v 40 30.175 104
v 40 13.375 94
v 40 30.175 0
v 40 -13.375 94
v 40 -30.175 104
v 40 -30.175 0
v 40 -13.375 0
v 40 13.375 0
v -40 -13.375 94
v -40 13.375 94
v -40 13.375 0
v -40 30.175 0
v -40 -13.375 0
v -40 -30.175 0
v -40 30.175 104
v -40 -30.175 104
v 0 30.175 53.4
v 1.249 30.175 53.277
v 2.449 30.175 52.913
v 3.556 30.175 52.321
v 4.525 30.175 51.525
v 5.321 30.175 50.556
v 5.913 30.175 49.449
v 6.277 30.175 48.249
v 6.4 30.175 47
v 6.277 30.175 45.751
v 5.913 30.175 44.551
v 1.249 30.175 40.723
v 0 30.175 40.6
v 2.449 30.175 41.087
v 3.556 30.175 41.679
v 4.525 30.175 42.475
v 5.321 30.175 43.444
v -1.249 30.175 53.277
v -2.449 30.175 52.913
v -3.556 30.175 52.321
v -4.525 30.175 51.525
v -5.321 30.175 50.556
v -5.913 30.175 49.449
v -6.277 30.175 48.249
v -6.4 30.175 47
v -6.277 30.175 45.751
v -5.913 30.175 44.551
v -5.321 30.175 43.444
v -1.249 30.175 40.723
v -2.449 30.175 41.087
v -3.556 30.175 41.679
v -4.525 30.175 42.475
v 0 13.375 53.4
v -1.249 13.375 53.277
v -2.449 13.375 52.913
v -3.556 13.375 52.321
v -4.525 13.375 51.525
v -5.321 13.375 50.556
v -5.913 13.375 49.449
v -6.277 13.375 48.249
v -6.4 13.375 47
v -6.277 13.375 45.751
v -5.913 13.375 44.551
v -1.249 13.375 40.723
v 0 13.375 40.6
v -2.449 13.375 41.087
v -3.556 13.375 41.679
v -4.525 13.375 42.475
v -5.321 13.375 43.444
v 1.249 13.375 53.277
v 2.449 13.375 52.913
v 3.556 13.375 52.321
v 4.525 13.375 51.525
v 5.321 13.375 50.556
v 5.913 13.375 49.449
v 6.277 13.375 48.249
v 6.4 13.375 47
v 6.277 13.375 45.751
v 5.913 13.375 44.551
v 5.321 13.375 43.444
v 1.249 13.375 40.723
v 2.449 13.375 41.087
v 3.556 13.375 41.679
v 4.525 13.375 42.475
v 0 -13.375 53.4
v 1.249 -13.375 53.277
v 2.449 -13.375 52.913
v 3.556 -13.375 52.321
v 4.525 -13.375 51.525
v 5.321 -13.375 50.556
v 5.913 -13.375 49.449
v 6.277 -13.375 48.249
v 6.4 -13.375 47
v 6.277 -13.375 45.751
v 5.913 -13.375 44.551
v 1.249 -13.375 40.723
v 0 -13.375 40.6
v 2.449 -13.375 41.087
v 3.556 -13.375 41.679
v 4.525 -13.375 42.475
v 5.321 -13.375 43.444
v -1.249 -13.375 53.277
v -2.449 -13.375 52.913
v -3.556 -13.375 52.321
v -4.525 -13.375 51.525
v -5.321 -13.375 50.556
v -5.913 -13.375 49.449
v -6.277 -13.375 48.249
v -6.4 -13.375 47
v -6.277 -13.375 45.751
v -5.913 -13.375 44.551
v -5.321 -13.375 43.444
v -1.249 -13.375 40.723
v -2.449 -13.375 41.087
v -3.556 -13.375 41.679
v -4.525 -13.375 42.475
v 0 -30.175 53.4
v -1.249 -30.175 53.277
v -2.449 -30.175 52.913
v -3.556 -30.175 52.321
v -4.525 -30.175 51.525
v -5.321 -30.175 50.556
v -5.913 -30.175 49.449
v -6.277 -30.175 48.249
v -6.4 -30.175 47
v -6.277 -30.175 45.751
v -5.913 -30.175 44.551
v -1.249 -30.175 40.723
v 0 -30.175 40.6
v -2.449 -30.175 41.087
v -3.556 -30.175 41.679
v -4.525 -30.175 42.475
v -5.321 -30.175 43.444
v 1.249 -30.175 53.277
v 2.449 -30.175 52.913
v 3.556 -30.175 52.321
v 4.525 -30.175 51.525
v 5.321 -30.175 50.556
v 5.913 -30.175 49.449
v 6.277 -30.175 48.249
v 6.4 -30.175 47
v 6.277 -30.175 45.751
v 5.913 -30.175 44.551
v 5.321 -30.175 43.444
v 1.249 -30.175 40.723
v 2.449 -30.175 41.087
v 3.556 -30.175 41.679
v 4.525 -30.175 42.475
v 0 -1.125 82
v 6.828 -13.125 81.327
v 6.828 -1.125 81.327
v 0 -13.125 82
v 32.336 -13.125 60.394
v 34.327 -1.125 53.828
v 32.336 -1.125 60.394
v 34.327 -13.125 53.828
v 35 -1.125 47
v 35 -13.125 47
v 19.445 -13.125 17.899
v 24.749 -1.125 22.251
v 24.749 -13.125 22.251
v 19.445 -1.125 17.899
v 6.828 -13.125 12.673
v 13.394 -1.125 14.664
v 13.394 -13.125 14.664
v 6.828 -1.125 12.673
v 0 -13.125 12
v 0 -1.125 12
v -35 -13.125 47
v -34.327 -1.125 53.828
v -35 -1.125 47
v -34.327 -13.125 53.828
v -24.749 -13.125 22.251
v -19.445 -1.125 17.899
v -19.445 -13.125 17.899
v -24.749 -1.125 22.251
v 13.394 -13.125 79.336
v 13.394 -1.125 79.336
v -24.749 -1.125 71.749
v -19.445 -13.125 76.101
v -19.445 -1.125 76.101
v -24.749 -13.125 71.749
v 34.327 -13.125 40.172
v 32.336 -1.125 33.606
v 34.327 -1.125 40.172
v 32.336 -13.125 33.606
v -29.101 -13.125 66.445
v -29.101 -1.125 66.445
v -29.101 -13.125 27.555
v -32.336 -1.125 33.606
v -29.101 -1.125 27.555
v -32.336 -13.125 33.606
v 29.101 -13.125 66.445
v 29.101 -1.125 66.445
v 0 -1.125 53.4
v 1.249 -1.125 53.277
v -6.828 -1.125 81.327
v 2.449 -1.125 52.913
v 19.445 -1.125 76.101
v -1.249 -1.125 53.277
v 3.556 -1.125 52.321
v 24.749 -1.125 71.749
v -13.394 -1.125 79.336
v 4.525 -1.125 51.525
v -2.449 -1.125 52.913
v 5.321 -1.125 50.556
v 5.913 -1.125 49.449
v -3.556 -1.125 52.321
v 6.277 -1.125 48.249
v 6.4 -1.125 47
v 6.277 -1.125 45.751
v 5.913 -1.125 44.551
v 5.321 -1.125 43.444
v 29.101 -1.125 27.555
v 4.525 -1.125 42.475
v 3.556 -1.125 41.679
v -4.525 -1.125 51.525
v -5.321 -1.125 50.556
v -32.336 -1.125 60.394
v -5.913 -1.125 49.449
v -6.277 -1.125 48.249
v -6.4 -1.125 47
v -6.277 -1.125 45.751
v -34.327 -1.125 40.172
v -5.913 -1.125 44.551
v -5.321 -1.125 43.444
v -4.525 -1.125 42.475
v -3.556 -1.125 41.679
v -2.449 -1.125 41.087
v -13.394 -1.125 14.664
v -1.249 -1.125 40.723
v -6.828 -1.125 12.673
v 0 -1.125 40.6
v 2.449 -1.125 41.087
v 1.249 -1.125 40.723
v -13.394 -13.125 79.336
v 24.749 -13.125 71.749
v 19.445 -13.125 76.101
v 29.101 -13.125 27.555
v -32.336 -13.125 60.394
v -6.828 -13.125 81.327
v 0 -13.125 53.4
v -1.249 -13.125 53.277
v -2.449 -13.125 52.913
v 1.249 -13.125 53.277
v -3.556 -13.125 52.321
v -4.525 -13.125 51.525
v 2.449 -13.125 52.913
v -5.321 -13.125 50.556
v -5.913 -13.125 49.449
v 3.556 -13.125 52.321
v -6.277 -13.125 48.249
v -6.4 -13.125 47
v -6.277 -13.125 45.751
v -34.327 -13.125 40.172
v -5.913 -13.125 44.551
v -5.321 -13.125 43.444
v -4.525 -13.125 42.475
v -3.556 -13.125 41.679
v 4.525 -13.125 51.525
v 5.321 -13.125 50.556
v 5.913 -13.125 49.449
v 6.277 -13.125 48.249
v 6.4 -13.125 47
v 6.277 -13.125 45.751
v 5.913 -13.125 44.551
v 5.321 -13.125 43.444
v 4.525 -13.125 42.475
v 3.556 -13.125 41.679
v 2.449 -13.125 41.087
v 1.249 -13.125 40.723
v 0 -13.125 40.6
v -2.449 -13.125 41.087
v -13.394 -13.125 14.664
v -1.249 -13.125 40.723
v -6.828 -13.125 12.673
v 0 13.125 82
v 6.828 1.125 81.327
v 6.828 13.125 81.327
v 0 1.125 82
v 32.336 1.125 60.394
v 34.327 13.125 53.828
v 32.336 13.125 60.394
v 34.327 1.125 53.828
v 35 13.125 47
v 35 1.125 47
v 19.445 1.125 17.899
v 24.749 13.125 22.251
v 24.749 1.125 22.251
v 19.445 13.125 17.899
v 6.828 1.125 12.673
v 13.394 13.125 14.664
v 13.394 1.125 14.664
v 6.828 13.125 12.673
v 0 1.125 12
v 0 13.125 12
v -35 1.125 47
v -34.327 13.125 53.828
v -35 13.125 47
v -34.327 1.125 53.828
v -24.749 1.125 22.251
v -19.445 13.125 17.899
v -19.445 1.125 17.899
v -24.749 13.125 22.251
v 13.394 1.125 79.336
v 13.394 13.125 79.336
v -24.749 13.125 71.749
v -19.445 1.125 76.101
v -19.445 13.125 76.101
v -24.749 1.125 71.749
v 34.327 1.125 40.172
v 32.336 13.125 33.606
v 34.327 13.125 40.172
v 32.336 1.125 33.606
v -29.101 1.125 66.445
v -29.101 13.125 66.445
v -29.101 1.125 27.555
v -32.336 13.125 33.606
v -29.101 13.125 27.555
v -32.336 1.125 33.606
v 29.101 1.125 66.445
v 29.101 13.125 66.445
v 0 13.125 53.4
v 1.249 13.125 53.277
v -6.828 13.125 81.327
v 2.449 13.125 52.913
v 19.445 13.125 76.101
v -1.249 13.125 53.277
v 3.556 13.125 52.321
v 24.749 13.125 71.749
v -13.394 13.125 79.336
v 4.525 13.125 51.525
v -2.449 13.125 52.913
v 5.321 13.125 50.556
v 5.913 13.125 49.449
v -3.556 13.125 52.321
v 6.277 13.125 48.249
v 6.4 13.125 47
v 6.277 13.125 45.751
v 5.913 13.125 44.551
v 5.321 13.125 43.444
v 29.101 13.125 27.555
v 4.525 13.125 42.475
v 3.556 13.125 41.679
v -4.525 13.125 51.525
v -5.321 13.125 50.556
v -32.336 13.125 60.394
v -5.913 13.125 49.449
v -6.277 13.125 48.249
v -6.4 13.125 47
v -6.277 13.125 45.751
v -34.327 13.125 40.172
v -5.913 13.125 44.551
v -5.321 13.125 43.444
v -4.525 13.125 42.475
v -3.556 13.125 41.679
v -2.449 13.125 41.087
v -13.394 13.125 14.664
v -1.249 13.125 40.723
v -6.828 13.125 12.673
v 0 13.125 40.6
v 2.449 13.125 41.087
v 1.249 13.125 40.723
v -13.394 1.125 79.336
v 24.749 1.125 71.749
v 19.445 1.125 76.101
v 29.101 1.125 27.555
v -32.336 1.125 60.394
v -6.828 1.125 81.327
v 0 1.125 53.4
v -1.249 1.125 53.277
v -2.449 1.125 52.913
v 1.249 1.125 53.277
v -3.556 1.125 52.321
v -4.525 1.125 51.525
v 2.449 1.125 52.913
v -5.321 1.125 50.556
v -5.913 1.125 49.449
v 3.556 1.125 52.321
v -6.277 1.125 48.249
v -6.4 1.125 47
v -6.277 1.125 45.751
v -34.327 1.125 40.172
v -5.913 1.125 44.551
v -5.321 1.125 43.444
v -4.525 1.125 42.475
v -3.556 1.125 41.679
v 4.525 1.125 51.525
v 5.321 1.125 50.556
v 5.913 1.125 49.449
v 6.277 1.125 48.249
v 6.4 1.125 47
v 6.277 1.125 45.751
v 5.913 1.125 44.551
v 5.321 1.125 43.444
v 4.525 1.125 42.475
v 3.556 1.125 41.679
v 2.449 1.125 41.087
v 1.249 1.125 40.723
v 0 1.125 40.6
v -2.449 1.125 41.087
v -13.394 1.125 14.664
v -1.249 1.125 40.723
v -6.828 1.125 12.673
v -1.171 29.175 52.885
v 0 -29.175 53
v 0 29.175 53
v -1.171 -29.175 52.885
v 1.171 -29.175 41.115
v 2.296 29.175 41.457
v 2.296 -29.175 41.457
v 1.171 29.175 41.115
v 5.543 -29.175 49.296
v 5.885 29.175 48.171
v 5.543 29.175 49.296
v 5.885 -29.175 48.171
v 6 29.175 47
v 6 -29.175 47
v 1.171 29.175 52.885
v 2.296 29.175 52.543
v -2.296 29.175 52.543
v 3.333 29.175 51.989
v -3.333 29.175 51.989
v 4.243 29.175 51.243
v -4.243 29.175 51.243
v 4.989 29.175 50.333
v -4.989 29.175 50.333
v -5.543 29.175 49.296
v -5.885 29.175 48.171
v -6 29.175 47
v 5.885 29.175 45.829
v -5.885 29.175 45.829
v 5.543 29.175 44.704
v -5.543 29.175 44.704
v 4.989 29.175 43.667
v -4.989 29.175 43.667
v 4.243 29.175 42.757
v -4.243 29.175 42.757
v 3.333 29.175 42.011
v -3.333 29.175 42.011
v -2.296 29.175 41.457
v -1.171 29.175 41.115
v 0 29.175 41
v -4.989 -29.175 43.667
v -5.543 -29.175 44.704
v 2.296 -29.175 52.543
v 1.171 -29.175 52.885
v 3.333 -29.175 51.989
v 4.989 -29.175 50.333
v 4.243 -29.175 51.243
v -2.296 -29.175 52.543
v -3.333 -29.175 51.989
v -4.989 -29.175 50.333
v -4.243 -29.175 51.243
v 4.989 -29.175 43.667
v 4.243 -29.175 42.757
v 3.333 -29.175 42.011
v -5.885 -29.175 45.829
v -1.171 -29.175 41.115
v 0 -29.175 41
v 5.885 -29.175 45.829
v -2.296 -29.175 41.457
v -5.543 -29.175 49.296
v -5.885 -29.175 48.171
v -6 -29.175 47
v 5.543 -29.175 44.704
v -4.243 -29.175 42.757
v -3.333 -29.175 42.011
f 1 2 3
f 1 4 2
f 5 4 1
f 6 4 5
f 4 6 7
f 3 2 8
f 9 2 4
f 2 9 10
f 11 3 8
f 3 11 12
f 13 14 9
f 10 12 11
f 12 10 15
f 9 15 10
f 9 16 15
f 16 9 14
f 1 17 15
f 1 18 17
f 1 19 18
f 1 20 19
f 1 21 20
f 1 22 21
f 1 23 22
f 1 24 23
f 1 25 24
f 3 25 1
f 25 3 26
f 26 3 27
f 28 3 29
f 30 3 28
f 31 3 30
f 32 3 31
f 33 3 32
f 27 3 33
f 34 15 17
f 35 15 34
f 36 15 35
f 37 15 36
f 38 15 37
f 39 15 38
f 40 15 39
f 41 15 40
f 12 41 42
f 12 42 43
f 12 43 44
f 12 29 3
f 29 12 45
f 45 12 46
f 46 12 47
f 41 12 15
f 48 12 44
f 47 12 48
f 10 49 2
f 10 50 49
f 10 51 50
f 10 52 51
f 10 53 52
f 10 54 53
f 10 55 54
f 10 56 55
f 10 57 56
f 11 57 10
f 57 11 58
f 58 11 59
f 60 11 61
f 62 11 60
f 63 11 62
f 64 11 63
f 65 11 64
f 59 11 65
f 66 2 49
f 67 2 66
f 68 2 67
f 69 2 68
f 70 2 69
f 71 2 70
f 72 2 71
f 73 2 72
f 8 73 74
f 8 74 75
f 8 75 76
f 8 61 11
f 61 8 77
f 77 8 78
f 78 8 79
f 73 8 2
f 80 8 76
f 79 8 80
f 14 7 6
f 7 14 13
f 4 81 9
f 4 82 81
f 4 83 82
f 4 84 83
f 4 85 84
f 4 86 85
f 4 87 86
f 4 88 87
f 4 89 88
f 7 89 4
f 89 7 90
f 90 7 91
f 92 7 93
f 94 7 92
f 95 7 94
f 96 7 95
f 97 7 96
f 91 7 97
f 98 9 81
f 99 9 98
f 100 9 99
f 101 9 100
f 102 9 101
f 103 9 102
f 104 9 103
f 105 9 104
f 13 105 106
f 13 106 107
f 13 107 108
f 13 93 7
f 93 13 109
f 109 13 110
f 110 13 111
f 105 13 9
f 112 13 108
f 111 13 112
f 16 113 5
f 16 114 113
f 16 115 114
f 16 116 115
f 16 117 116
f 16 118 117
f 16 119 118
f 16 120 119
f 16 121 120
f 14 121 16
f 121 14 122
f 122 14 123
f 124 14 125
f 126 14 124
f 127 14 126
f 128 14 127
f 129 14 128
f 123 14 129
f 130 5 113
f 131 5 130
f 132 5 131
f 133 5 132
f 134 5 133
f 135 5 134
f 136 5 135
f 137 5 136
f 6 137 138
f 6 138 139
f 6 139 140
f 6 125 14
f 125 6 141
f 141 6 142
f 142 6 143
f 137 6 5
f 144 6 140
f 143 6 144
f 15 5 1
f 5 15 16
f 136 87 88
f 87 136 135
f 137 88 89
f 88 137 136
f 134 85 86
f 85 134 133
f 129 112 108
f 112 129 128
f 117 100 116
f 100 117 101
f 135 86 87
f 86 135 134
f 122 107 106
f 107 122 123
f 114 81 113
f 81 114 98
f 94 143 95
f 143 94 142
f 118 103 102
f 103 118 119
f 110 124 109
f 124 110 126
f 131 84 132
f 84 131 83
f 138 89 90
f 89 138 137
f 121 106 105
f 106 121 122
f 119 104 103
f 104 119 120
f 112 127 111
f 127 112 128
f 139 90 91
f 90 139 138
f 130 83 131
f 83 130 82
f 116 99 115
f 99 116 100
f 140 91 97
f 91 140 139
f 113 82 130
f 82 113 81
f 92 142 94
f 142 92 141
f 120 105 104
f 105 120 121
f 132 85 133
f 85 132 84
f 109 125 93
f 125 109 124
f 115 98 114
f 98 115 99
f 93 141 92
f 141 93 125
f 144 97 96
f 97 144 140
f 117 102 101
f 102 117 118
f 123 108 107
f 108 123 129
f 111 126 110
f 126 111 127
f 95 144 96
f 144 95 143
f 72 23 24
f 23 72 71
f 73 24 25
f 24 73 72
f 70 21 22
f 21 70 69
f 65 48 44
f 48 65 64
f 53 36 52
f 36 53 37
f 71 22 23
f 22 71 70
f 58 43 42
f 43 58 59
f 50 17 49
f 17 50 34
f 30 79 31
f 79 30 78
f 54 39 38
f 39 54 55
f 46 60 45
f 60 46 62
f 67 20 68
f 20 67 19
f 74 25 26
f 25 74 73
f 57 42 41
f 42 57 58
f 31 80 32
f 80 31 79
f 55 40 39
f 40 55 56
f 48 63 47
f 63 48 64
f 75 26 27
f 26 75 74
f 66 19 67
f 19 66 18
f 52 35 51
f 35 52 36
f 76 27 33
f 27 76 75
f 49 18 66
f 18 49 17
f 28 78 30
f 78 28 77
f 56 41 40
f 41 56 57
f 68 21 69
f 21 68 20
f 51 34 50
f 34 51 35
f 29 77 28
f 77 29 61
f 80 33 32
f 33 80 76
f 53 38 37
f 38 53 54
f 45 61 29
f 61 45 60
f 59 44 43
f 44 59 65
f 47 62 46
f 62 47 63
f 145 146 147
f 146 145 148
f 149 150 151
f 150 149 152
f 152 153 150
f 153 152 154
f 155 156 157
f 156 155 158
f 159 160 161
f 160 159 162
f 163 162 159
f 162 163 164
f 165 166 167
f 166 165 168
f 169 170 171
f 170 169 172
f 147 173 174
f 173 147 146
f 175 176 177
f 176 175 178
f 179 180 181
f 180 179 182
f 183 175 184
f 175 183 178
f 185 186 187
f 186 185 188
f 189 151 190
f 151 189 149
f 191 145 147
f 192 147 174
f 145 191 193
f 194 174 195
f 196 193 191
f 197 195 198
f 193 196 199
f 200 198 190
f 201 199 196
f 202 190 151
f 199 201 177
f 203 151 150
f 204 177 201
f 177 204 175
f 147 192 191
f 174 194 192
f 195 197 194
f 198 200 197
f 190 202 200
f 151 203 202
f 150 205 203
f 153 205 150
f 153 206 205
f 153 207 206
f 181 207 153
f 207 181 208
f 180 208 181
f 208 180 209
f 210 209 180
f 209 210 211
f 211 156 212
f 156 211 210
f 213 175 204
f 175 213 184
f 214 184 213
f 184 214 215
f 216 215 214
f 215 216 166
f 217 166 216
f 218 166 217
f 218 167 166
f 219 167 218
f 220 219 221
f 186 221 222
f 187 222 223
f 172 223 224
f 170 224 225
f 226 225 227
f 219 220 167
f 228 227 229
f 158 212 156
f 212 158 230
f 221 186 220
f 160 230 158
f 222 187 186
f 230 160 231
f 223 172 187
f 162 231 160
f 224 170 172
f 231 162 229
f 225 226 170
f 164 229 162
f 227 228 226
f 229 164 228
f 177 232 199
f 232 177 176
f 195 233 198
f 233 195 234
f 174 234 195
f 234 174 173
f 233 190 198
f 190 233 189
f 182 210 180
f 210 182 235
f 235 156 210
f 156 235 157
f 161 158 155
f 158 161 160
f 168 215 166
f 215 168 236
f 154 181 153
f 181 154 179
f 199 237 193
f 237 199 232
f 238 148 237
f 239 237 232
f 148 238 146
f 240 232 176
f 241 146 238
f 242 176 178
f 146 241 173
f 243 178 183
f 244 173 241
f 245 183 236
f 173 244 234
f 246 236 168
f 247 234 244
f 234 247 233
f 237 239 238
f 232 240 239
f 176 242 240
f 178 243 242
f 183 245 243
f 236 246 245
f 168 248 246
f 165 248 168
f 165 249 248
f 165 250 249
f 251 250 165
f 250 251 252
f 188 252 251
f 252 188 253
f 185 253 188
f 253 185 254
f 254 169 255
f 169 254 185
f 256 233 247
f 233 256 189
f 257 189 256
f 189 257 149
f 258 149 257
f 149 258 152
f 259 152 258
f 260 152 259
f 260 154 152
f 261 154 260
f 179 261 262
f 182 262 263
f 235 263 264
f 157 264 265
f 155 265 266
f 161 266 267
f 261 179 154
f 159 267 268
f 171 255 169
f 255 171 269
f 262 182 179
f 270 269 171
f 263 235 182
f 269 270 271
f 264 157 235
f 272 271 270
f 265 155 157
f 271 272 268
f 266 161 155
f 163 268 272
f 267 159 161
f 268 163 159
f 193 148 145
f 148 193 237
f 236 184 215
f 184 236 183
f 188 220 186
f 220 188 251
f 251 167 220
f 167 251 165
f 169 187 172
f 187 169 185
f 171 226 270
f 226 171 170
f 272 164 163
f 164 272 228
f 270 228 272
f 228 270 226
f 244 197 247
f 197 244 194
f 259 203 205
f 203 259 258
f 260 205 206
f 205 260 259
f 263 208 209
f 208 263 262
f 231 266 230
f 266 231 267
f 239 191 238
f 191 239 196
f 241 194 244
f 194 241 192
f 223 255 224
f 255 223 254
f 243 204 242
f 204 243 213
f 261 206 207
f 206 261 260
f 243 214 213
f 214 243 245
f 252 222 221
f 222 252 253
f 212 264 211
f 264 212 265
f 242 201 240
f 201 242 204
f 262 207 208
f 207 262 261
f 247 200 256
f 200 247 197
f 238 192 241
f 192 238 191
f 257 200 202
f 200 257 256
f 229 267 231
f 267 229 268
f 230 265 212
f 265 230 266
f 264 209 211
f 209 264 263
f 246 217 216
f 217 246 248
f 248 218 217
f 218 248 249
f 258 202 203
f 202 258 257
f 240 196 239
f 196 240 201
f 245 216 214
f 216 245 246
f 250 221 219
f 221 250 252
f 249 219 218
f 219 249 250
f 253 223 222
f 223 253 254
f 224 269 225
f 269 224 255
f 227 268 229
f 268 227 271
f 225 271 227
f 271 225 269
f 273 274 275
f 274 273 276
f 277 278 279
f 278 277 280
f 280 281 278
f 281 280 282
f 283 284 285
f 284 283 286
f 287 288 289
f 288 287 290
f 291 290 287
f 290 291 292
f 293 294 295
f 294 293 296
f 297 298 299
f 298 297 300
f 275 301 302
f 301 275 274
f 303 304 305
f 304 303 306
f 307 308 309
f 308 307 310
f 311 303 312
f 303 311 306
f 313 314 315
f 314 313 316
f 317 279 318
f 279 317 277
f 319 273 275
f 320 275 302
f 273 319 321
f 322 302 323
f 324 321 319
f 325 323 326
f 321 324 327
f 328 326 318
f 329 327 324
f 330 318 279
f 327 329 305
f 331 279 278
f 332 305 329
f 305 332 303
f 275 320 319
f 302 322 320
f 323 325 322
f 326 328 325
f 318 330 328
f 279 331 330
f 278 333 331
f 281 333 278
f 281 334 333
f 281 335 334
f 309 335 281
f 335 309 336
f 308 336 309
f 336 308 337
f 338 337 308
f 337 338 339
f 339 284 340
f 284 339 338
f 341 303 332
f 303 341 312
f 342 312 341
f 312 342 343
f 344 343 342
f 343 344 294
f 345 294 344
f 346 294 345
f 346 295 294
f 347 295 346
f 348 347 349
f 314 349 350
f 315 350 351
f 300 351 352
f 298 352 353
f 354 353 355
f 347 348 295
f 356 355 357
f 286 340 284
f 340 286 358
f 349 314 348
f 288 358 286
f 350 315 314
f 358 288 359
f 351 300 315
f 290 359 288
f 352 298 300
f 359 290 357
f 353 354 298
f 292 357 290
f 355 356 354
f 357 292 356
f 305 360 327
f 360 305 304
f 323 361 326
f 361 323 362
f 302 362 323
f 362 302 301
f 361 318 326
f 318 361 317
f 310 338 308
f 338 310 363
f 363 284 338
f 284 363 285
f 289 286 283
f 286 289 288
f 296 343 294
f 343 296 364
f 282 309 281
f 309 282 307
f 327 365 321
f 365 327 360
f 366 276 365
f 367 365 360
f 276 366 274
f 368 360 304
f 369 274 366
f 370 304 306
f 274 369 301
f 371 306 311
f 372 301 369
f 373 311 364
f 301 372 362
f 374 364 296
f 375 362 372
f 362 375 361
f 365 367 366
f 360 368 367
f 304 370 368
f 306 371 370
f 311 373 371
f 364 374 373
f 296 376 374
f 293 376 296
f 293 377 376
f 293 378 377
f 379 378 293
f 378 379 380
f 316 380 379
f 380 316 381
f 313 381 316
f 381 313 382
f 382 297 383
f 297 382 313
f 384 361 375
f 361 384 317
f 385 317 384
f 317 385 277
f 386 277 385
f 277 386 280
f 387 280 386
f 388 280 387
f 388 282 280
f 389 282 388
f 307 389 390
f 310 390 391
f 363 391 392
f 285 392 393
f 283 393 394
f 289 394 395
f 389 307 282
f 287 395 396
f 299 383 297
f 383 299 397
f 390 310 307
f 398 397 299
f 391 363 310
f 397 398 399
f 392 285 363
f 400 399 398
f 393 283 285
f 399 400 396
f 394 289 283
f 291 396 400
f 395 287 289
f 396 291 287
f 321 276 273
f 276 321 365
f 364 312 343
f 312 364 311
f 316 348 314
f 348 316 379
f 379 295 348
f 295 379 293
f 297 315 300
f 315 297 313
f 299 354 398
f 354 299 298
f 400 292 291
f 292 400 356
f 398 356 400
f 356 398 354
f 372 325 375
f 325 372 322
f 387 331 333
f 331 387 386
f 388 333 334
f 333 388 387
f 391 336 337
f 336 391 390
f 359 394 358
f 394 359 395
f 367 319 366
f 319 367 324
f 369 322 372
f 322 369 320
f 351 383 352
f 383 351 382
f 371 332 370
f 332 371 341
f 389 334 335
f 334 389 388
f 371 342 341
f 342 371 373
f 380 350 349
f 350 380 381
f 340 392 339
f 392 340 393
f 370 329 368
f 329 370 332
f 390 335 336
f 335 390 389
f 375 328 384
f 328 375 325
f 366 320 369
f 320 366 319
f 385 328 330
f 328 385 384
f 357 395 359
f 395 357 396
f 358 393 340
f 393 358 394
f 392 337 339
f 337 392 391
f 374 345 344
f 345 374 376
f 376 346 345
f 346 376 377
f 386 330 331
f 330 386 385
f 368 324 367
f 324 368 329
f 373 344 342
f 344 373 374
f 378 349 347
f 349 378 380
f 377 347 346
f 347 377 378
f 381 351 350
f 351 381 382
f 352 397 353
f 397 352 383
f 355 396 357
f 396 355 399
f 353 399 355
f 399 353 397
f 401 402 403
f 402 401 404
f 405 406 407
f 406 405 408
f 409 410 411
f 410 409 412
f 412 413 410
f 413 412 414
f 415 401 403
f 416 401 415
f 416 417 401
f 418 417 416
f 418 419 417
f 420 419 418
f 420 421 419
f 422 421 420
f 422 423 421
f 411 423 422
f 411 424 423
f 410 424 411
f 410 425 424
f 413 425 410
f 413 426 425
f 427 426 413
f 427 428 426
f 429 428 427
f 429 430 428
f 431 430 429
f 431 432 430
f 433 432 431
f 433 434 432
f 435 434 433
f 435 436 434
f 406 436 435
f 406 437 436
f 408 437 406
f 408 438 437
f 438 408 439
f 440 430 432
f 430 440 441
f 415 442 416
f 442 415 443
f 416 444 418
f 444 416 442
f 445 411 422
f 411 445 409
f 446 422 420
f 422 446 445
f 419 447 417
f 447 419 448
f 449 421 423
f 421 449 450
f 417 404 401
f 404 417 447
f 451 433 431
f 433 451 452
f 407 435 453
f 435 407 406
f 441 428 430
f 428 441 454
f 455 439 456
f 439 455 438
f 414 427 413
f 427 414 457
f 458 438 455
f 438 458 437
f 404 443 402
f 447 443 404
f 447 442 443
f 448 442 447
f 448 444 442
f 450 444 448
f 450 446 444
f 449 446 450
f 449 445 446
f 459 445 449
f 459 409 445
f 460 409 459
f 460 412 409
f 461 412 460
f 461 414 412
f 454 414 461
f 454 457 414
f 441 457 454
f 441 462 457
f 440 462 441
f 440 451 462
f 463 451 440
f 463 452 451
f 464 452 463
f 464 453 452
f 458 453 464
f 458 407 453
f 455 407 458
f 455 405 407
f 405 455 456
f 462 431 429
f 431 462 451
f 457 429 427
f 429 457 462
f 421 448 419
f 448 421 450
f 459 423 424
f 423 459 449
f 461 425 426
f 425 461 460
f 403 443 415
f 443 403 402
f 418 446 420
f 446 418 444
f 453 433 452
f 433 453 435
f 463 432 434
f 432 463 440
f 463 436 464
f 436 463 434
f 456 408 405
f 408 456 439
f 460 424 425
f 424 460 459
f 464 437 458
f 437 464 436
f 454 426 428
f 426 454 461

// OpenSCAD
$fn = 32;

// ------------------------------------------------------------------------
// Trolley wheel set: wheels d70, fork 94 mm tall
// Every part is its own module, assembly() places every instance.
// ------------------------------------------------------------------------

// --- part 1 ---
module trolley_fork() {
  difference() {
    union() {
      translate([-40, 13.375, 0]) cube([80, 16.8, 94]);
      translate([-40, -30.175, 0]) cube([80, 16.8, 94]);
      translate([-40, -30.175, 94]) cube([80, 60.35, 10]);
    }
    translate([0, -21.775, 47]) rotate([90, 0, 0]) cylinder(h = 18.8, d = 12.8, center = true);
    translate([0, 21.775, 47]) rotate([90, 0, 0]) cylinder(h = 18.8, d = 12.8, center = true);
  }
}

// --- part 2 ---
module trolley_wheel() {
  difference() {
      translate([0, 0, 0]) cylinder(h = 12, d = 70);
      translate([0, 0, -1]) cylinder(h = 14, d = 12.8);
    }
}

// --- part 3 ---
module trolley_axle() {
  translate([0, 0, -29.175]) cylinder(h = 58.35, d = 12);
}

// --- assembly ---
module assembly() {
  color([0.80, 0.24, 0.20]) translate([0, 0, 0]) rotate([0, 0, 0]) trolley_fork();
  color([0.20, 0.45, 0.75]) translate([0, -1.125, 47]) rotate([90, 0, 0]) trolley_wheel();
  color([0.25, 0.62, 0.32]) translate([0, 13.125, 47]) rotate([90, 0, 0]) trolley_wheel();
  color([0.92, 0.70, 0.18]) translate([0, 0, 47]) rotate([90, 0, 0]) trolley_axle();
}

assembly();
